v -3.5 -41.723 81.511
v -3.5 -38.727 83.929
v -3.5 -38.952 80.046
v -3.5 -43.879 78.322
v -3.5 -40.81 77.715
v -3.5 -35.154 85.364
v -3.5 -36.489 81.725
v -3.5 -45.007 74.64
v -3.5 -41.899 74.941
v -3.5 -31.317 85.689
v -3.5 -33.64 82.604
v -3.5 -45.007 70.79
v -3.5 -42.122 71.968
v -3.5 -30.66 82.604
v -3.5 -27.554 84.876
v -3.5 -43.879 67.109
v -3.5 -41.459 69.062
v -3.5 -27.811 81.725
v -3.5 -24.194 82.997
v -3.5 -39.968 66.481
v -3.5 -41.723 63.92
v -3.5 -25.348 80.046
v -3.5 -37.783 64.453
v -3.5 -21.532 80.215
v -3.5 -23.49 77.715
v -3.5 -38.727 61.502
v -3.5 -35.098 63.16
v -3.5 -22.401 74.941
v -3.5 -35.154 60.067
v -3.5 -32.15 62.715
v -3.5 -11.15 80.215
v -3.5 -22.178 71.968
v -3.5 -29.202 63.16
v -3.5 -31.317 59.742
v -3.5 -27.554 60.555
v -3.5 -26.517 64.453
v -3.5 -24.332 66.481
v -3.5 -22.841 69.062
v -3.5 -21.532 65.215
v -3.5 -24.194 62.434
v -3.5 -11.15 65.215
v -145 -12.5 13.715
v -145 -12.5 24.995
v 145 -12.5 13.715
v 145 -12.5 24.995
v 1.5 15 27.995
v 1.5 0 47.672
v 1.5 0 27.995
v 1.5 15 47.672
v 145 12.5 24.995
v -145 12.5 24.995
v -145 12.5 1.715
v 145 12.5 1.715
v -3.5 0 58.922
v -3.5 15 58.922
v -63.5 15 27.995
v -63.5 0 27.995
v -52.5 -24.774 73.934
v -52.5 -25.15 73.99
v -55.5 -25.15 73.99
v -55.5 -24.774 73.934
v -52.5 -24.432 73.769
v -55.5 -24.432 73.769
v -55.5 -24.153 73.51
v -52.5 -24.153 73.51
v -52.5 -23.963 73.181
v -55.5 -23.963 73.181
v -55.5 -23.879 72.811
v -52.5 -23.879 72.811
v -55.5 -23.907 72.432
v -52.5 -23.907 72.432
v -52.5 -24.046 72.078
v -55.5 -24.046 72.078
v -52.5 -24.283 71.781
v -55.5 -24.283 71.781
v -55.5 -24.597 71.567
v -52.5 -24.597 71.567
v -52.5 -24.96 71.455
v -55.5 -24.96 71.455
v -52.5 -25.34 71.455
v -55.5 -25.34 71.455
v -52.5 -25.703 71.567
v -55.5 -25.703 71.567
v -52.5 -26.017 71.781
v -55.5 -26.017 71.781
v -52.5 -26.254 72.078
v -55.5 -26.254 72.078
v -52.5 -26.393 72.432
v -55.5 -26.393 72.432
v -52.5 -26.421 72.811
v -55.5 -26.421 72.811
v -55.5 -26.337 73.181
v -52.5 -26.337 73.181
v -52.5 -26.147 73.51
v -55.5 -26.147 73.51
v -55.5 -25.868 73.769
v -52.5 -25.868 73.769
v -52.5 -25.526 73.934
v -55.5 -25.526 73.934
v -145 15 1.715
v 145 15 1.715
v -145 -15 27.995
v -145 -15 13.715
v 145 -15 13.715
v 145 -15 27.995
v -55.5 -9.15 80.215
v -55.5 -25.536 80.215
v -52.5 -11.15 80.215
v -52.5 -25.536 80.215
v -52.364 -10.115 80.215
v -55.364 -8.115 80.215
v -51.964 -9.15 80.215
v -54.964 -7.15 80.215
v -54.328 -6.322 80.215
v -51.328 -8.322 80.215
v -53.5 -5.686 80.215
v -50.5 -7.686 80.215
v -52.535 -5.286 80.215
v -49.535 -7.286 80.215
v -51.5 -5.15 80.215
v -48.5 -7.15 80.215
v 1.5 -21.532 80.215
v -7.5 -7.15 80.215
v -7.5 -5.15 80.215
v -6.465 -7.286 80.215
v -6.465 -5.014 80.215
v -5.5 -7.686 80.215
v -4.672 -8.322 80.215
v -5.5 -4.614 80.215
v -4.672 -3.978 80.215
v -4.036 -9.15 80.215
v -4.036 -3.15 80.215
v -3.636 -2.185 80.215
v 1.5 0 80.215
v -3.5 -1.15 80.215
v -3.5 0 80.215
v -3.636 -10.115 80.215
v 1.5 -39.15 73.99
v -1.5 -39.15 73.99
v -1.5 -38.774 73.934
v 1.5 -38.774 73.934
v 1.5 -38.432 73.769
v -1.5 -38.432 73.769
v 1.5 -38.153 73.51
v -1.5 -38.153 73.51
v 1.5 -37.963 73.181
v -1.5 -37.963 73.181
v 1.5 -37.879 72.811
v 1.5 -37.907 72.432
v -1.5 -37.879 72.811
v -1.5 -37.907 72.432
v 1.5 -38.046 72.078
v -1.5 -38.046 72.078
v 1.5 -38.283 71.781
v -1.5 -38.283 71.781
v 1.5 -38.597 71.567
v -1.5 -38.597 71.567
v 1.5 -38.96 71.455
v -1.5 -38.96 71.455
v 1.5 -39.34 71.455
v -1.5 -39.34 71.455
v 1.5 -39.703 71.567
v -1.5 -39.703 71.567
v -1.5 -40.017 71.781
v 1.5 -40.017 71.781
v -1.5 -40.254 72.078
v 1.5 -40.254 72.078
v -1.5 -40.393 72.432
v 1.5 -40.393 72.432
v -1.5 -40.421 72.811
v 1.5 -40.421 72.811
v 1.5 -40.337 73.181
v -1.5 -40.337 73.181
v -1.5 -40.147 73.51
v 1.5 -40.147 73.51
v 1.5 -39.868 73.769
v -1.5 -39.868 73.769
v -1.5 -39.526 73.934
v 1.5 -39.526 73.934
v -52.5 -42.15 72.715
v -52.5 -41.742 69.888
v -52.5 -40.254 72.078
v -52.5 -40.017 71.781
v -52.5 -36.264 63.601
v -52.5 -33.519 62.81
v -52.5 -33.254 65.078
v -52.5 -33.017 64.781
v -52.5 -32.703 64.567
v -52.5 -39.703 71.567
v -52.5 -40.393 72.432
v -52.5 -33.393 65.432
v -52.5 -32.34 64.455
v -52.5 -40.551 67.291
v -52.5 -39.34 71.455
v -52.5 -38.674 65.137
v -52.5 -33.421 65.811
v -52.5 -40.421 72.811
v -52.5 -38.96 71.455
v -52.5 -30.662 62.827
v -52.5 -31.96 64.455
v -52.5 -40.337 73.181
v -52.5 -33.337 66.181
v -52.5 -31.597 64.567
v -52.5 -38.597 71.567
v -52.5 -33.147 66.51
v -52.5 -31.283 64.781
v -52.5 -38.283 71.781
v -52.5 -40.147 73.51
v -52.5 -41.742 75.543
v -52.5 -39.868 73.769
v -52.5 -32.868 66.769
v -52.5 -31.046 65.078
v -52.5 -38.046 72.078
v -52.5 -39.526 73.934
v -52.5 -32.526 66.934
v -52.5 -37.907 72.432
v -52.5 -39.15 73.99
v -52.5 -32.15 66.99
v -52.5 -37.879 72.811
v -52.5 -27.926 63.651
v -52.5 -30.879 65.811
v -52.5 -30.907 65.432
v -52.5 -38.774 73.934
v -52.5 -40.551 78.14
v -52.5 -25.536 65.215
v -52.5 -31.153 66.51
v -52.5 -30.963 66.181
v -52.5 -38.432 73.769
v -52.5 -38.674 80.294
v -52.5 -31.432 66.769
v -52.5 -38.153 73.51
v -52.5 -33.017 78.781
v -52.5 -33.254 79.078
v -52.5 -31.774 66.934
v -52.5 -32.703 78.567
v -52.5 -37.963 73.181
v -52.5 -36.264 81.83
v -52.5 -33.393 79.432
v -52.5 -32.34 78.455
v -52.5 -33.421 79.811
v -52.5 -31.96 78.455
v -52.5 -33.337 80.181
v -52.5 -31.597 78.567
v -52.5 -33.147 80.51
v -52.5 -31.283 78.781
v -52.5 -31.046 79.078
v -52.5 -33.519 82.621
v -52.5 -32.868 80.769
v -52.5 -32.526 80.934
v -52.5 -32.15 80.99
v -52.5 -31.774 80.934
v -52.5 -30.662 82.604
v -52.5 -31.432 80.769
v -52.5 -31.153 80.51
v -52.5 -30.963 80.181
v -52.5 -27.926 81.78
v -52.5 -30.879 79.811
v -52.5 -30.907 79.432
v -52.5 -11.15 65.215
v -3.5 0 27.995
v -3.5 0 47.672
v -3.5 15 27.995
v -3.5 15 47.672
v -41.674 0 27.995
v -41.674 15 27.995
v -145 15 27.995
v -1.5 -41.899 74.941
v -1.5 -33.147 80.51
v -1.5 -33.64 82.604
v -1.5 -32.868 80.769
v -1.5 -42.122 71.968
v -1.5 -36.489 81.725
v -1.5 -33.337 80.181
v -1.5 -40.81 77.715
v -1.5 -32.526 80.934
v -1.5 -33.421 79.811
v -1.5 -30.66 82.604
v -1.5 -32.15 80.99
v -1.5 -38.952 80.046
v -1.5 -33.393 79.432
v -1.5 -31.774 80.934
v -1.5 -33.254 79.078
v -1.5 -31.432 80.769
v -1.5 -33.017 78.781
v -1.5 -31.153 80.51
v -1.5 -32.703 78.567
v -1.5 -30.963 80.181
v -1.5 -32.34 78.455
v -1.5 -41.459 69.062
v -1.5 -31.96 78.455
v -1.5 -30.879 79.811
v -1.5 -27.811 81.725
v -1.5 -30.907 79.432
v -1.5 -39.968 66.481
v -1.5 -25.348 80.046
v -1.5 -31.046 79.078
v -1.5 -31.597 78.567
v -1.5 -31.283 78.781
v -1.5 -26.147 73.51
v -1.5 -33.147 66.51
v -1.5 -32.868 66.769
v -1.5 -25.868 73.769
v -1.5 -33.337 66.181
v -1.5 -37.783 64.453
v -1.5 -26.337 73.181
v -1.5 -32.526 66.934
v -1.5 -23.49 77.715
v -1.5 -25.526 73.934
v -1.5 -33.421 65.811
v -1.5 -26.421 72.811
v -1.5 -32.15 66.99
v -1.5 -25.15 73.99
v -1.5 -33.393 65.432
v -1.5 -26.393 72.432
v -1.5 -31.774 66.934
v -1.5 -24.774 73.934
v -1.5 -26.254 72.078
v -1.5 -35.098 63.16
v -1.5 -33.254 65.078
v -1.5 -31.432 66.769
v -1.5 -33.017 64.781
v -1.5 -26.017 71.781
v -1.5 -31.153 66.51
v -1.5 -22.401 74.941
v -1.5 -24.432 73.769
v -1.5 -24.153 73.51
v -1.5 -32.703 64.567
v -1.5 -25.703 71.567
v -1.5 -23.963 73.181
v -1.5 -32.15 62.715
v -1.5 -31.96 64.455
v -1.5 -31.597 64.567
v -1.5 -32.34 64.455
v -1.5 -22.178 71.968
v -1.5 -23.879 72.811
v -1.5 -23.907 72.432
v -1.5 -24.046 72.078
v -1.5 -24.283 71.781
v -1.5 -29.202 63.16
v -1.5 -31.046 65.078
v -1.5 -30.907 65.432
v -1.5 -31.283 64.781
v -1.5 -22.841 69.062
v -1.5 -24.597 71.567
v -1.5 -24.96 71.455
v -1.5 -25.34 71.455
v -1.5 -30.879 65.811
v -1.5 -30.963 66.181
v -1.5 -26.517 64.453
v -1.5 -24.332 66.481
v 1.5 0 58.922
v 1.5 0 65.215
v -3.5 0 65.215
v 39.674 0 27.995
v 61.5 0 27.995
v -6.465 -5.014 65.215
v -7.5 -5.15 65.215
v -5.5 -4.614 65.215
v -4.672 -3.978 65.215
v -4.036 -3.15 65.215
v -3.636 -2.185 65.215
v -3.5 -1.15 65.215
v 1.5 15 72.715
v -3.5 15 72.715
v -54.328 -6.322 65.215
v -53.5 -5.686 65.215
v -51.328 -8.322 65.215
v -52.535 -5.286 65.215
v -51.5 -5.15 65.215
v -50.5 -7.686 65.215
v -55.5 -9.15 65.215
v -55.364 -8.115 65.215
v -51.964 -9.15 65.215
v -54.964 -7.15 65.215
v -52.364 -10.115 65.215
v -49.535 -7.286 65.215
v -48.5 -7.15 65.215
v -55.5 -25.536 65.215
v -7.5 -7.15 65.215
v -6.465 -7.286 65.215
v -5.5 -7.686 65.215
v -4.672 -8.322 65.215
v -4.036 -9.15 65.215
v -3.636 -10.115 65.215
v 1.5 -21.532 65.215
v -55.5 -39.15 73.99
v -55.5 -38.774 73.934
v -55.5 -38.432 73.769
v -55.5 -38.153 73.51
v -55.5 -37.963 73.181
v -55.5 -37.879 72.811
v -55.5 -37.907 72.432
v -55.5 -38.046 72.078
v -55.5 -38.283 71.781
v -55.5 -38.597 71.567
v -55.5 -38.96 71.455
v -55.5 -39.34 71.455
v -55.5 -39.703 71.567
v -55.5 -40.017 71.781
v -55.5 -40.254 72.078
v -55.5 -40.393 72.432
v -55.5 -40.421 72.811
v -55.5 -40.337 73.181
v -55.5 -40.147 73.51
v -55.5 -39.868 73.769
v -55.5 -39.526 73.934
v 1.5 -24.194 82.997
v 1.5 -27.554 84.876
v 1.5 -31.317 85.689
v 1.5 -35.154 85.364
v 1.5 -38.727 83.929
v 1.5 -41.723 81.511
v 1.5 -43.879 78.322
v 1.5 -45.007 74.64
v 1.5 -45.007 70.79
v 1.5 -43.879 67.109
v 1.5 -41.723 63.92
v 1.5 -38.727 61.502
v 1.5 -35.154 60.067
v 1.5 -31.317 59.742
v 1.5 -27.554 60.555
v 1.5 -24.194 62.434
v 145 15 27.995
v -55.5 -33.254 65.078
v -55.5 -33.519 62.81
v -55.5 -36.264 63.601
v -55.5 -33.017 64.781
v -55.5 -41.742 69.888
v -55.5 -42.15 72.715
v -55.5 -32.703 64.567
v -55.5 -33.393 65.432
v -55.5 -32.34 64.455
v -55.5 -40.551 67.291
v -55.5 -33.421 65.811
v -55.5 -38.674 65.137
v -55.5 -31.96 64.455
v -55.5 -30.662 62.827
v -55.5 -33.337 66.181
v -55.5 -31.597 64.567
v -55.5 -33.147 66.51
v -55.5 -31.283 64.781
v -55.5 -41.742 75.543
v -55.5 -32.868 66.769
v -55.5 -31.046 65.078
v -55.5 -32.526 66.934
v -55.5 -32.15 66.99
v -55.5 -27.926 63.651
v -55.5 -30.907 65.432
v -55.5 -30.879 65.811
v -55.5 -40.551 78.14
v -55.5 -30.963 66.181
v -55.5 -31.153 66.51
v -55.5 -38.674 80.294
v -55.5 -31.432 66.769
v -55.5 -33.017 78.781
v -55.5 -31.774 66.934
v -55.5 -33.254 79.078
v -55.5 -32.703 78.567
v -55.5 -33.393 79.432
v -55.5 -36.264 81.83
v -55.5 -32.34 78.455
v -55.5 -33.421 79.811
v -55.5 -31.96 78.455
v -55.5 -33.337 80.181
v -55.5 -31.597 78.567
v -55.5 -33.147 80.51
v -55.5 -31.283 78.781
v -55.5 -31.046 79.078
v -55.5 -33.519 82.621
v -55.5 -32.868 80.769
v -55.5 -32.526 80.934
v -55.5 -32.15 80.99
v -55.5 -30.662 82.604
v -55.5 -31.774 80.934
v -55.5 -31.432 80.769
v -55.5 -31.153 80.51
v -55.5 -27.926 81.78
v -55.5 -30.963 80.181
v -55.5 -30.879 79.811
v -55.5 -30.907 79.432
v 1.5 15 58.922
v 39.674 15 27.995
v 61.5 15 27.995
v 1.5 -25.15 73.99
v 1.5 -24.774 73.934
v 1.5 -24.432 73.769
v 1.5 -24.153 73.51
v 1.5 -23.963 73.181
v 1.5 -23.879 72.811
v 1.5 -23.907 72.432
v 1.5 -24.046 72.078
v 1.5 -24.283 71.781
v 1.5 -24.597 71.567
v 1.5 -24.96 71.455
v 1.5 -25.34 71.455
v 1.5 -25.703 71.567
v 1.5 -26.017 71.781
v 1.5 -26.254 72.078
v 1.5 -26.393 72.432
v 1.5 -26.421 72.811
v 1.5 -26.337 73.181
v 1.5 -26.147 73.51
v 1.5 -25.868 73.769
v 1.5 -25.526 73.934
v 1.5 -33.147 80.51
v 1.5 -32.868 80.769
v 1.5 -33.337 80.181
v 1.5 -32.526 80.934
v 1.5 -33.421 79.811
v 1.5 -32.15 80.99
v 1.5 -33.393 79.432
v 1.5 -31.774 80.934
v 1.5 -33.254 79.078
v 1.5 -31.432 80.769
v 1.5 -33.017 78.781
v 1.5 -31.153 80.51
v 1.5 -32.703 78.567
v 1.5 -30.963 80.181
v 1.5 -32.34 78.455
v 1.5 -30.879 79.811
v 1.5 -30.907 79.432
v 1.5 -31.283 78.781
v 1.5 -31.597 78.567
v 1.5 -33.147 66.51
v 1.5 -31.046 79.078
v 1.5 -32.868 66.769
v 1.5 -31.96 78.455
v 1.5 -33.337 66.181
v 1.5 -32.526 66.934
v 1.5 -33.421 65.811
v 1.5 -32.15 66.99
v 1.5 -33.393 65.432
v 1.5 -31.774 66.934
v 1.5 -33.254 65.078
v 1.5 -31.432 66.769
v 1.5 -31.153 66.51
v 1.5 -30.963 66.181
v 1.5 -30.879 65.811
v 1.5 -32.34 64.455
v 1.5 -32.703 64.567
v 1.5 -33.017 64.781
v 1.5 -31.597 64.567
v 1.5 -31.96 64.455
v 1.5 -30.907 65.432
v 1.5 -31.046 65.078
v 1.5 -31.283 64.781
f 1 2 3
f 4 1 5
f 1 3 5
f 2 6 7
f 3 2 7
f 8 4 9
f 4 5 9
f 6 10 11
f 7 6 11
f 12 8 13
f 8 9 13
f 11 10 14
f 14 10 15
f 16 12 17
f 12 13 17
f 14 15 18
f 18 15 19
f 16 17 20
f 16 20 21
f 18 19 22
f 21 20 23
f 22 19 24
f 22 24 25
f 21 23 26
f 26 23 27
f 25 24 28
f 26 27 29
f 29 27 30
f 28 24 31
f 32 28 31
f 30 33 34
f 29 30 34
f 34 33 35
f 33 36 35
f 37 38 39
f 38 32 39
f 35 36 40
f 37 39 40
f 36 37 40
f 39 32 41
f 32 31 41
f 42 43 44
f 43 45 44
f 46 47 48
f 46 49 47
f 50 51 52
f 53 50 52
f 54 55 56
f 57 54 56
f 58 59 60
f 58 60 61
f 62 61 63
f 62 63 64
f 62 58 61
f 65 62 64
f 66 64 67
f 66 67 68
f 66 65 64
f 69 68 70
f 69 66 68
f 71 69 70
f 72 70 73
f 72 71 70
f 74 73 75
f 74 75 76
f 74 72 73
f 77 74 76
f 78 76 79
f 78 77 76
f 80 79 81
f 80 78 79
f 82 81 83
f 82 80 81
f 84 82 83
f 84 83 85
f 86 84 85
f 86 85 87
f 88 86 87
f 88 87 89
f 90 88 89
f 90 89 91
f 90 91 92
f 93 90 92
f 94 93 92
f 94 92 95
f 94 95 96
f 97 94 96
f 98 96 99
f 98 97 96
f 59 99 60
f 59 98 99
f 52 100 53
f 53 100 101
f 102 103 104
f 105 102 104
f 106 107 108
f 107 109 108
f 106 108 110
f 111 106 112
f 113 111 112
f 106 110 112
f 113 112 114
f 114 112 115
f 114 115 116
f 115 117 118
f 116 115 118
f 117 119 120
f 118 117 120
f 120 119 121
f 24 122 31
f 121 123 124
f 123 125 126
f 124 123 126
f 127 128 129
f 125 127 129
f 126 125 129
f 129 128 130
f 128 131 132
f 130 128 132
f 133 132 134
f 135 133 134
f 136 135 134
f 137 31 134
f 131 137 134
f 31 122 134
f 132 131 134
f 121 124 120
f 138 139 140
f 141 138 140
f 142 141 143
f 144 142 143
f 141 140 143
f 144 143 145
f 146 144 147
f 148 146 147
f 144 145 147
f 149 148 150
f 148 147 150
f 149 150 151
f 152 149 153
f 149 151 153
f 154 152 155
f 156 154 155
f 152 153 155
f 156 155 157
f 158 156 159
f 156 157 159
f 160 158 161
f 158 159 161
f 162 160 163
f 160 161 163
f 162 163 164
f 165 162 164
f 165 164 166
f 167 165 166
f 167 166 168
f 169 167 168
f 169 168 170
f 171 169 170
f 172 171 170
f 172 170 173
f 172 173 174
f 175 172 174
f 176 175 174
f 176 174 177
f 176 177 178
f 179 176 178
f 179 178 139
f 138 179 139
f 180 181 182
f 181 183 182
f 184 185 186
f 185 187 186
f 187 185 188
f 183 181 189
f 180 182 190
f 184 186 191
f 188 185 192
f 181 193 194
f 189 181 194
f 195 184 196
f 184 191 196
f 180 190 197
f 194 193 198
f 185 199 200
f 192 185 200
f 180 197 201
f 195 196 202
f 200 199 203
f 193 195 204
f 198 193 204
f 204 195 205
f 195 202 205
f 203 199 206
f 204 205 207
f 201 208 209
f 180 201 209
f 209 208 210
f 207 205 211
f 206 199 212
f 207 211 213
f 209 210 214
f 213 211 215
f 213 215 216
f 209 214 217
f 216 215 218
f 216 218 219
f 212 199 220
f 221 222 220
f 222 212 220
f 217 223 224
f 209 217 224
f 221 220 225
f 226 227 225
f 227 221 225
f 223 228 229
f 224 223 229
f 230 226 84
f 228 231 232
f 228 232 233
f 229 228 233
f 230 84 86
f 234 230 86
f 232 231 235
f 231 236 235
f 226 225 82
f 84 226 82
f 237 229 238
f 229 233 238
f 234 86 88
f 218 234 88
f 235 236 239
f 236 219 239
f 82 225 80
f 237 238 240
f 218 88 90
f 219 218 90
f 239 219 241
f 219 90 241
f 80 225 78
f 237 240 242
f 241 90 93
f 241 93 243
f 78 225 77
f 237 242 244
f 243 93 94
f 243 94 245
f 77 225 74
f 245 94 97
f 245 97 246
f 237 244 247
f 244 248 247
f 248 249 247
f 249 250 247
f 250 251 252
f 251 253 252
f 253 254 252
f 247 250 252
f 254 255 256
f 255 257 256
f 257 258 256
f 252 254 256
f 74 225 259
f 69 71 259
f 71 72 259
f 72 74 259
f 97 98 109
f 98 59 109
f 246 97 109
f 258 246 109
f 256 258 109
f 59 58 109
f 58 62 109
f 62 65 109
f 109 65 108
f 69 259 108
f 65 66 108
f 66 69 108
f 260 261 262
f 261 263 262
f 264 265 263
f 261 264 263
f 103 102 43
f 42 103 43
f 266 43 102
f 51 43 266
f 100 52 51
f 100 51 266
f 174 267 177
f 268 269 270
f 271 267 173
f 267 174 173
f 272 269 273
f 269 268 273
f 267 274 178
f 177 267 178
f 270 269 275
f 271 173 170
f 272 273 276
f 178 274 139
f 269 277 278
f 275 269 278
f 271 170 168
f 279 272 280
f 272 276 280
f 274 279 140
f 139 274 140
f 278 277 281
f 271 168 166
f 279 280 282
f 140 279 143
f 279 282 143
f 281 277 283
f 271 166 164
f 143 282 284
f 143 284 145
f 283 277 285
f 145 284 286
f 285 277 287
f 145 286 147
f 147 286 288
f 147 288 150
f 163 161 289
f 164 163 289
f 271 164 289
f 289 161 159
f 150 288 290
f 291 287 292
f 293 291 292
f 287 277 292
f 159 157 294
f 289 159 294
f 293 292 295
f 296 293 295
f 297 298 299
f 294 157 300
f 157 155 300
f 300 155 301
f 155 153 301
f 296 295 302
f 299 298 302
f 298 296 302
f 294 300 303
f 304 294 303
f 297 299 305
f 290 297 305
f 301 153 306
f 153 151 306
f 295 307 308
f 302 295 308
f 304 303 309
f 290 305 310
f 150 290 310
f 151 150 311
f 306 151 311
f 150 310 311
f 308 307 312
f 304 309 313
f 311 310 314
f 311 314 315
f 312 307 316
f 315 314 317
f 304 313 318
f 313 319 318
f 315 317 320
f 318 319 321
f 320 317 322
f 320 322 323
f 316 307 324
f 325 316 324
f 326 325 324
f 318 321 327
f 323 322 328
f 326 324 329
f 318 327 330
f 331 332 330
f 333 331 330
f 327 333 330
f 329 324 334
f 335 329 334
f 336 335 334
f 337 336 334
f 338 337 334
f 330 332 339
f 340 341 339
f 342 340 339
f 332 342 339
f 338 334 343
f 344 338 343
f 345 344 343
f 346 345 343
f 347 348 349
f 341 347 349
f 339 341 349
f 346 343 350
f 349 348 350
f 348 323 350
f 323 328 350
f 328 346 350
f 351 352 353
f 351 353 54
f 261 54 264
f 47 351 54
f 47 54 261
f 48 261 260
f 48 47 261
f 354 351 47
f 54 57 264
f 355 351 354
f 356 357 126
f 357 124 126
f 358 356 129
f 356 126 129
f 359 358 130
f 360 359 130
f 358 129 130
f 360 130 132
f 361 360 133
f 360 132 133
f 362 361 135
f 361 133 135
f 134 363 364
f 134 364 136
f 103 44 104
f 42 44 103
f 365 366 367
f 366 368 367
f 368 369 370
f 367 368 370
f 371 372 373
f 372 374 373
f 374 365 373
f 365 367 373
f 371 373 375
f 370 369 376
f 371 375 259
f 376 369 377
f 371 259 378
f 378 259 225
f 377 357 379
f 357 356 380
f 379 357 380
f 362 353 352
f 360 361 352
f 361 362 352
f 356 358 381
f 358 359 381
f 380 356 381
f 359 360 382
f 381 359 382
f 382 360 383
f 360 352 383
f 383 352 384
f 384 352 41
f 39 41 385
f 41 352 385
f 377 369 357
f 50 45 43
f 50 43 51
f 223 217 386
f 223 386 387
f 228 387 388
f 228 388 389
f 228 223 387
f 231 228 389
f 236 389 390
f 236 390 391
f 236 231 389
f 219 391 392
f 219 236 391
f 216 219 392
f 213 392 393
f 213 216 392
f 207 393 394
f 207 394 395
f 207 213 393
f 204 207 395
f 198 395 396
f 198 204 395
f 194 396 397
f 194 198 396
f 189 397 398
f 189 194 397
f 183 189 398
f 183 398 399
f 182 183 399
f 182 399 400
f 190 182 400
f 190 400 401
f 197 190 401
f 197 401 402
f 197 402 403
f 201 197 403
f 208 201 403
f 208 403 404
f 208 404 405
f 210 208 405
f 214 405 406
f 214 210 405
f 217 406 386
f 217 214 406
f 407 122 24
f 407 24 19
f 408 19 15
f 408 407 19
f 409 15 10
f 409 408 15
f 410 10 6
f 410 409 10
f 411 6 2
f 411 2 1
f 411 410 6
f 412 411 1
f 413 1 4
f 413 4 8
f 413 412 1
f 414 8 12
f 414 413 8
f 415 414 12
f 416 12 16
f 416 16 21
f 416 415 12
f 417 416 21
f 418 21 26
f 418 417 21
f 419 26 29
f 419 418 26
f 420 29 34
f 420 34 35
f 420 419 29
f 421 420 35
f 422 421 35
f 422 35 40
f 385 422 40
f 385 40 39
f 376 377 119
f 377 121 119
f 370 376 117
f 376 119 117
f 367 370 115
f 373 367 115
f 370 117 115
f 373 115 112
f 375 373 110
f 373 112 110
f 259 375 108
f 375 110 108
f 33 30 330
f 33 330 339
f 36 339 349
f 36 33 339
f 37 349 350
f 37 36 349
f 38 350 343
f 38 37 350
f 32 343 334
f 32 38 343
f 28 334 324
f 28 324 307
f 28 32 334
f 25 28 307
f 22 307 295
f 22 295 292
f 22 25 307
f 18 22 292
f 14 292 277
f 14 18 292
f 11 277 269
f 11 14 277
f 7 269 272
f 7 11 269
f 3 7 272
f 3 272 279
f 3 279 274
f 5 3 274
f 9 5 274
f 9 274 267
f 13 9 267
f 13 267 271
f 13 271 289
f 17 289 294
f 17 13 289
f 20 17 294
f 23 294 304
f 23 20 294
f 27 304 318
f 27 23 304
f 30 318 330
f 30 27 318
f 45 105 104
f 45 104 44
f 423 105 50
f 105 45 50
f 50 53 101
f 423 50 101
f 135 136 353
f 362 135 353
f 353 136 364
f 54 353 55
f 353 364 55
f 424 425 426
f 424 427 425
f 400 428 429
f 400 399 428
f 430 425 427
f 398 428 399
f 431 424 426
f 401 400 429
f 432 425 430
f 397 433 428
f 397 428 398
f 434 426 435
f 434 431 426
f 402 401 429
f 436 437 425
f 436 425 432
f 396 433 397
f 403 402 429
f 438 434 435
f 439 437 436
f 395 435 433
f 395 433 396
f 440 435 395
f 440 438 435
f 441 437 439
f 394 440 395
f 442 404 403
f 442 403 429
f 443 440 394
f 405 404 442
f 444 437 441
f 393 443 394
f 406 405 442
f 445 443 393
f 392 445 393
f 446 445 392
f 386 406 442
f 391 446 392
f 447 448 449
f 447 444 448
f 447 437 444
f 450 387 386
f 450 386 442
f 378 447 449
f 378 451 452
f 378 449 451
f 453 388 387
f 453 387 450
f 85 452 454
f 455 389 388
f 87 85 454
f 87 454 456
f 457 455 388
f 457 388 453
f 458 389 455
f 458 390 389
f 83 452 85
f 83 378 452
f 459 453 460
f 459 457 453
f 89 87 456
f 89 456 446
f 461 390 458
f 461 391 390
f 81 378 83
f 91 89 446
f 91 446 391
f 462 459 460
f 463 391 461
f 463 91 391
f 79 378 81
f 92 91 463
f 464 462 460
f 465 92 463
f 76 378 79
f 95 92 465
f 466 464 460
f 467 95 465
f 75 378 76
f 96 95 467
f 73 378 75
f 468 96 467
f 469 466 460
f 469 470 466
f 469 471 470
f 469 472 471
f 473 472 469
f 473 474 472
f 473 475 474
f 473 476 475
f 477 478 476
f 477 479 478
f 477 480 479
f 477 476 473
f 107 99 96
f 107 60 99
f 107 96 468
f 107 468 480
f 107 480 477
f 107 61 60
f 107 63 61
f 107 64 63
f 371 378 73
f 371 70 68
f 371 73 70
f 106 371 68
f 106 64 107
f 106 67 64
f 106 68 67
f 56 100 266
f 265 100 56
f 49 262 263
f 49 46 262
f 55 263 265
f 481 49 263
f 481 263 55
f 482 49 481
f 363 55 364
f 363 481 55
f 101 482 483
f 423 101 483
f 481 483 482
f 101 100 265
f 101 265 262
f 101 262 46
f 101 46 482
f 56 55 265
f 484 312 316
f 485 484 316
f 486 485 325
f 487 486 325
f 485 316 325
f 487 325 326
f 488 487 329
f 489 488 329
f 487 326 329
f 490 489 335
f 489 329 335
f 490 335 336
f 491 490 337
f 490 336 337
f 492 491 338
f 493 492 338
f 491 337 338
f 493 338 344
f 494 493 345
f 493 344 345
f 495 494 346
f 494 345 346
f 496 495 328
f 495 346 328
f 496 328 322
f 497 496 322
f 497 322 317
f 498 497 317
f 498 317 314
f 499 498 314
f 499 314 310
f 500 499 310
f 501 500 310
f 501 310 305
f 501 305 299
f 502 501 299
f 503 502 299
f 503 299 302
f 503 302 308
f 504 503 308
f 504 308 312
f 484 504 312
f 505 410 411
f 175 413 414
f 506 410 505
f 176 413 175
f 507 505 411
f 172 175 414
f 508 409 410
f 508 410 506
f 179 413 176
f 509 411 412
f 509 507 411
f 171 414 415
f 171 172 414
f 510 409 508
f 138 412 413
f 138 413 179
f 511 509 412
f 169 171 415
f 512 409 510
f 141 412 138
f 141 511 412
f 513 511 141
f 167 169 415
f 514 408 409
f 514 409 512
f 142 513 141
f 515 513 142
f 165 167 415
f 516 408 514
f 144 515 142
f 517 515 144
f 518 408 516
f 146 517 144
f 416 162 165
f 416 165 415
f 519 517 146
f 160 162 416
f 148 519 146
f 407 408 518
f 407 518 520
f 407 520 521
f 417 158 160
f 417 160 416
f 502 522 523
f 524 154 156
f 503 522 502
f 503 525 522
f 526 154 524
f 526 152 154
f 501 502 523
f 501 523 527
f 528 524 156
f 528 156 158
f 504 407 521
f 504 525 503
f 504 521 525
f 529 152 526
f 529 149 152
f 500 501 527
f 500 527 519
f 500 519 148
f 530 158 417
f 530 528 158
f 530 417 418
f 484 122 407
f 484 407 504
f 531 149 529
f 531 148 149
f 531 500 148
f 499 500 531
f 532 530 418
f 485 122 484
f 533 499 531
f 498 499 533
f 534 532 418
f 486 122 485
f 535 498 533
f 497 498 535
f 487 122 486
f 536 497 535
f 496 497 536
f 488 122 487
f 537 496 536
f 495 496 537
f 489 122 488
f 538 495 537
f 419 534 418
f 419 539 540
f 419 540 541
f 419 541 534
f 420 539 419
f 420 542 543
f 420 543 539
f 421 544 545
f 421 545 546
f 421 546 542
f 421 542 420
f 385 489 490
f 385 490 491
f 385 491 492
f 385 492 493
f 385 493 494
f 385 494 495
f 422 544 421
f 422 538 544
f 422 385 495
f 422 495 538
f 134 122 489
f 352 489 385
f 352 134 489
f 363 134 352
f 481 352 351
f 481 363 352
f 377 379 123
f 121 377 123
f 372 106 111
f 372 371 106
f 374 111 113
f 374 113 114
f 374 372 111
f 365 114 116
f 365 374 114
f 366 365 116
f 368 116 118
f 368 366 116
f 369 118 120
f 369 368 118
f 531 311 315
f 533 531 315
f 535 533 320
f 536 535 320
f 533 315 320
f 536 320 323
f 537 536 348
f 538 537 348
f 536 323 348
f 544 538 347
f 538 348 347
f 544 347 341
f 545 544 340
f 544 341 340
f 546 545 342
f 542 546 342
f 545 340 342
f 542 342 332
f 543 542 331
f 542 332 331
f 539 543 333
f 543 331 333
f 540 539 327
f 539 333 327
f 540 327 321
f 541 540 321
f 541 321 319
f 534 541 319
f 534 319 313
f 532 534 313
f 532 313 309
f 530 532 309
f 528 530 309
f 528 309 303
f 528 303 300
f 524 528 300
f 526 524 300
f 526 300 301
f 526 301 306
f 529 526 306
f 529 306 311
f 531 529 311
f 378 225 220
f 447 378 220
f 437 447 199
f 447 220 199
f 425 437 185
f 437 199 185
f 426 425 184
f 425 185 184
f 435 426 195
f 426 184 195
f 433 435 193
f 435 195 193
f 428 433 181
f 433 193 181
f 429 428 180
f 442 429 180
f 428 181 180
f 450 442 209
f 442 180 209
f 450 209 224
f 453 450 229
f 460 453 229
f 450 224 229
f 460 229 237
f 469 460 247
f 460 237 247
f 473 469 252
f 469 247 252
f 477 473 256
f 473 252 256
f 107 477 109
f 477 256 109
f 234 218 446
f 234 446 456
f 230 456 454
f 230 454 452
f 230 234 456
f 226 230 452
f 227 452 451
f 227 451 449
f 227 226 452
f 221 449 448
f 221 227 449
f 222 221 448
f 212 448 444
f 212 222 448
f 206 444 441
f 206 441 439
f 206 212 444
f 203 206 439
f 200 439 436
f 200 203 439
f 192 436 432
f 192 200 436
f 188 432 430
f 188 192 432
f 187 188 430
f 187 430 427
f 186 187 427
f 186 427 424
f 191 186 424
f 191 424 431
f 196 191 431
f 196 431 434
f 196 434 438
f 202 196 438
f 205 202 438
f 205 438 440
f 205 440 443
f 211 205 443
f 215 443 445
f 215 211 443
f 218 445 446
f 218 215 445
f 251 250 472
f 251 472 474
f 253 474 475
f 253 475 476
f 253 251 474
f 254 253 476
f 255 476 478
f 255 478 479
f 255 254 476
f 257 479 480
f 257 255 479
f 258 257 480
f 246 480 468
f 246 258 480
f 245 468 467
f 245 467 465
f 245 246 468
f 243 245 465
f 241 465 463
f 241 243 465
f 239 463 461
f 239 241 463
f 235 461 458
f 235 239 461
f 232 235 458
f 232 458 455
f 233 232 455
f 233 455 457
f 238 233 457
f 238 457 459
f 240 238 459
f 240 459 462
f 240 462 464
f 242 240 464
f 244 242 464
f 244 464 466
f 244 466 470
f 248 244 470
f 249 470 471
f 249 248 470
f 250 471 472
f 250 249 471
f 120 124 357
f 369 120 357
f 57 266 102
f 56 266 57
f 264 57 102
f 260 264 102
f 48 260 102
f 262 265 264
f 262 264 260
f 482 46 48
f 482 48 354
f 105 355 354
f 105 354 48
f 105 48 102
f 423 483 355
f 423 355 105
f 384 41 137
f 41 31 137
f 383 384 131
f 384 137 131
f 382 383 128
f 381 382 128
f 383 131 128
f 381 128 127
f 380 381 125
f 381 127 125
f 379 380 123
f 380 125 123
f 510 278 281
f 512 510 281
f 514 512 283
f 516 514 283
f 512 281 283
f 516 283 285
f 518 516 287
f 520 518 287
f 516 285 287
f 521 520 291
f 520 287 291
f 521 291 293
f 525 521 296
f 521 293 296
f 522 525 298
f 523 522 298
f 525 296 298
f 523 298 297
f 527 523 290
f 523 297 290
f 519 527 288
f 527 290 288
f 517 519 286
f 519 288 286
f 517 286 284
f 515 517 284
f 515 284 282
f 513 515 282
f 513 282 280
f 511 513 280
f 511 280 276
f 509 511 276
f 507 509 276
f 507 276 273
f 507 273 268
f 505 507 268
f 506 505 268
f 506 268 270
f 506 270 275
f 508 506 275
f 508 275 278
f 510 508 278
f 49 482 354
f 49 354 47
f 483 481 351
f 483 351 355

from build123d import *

# Parameters (mm, degrees)
SKETCH2_W                = 290
SKETCH2_H                = 30
SKETCH2_W_2              = 280
SKETCH2_H_2              = 25
BOSS_EXTRUDE1_DEPTH      = 23.28
SKETCH3_W                = 290
SKETCH3_H                = 30
BOSS_EXTRUDE2_DEPTH      = 3
SKETCH4_W                = 23.28
SKETCH4_H                = 25
CUT_EXTRUDE1_DEPTH       = 1
CUT_EXTRUDE1_DEPTH_BACK  = 291
BOSS_EXTRUDE3_DEPTH      = 2
BOSS_EXTRUDE3_DEPTH_BACK = 3
SKETCH6_R                = 10
CUT_EXTRUDE2_DEPTH       = 2
SKETCH7_R                = 1.275
CUT_EXTRUDE3_DEPTH       = 10
SKETCH8_W                = 290
SKETCH8_H                = 2.5
CUT_EXTRUDE4_DEPTH       = 12
BOSS_EXTRUDE4_DEPTH      = 15
ESQUISSE1_W              = 15
ESQUISSE1_H              = 2
BOSS_EXTRU_1_DEPTH       = 49
ESQUISSE2_R              = 1.275
BOSS_EXTRU_2_DEPTH       = 3
CONG_1_R                 = 4


with BuildPart() as part:
    # Sketch2 → Boss-Extrude1 (new body)
    with BuildSketch(Plane.XY.offset(1.715456747)):
        Rectangle(SKETCH2_W, SKETCH2_H)
        Rectangle(SKETCH2_W_2, SKETCH2_H_2, mode=Mode.SUBTRACT)
    extrude(amount=BOSS_EXTRUDE1_DEPTH)

    # Sketch3 → Boss-Extrude2 (add)
    with BuildSketch(Plane.XY.offset(24.995456747)):
        Rectangle(SKETCH3_W, SKETCH3_H)
    extrude(amount=BOSS_EXTRUDE2_DEPTH)

    # Sketch4 → Cut-Extrude1 (cut, two sides)
    with BuildSketch(Plane(origin=(145, 0, 0), x_dir=(0, 0, -1), z_dir=(1, 0, 0))) as cut_extrude1_sk:
        with Locations((-13.355456747, 0)):
            Rectangle(SKETCH4_W, SKETCH4_H)
    extrude(amount=CUT_EXTRUDE1_DEPTH, mode=Mode.SUBTRACT)
    extrude(cut_extrude1_sk.sketch, amount=-CUT_EXTRUDE1_DEPTH_BACK, mode=Mode.SUBTRACT)

    # Sketch5 → Boss-Extrude3 (add, two sides)
    with BuildSketch(Plane(origin=(-0.5, 0, 0), x_dir=(0, 0, -1), z_dir=(1, 0, 0))) as boss_extrude3_sk:
        with BuildLine():
            Line((-27.995456747, 0), (-27.995456747, 15))
            Line((-27.995456747, 15), (-72.715456747, 15))
            Line((-72.715456747, 15), (-80.215456747, 0))
            Line((-80.215456747, 0), (-80.215456747, -21.531619709))
            ThreePointArc((-80.215456747, -21.531619709), (-72.715456747, -45.15), (-65.215456747, -21.531619709))
            Line((-65.215456747, -21.531619709), (-65.215456747, 0))
            Line((-65.215456747, 0), (-27.995456747, 0))
        make_face()
    extrude(amount=BOSS_EXTRUDE3_DEPTH)
    extrude(boss_extrude3_sk.sketch, amount=-BOSS_EXTRUDE3_DEPTH_BACK)

    # Sketch6 → Cut-Extrude2 (cut)
    with BuildSketch(Plane(origin=(-3.5, 0, 0), x_dir=(0, 0, -1), z_dir=(1, 0, 0))):
        with Locations((-72.715456747, -32.15)):
            Circle(SKETCH6_R)
    extrude(amount=CUT_EXTRUDE2_DEPTH, mode=Mode.SUBTRACT)

    # Sketch7 → Cut-Extrude3 (cut)
    with BuildSketch(Plane.ZY.offset(3.5)):
        with Locations((72.715456747, -25.15)):
            Circle(SKETCH7_R)
        with Locations((79.715456747, -32.15)):
            Circle(SKETCH7_R)
        with Locations((72.715456747, -39.15)):
            Circle(SKETCH7_R)
        with Locations((65.715456747, -32.15)):
            Circle(SKETCH7_R)
    extrude(amount=-CUT_EXTRUDE3_DEPTH, mode=Mode.SUBTRACT)

    # Sketch8 → Cut-Extrude4 (cut)
    with BuildSketch(Plane(origin=(0, 0, 1.715456747), x_dir=(-1, 0, 0), z_dir=(0, 0, -1))):
        with Locations((0, -13.75)):
            Rectangle(SKETCH8_W, SKETCH8_H)
    extrude(amount=-CUT_EXTRUDE4_DEPTH, mode=Mode.SUBTRACT)

    # Sketch9 → Boss-Extrude4 (add)
    with BuildSketch(Plane(origin=(0, 15, 0), x_dir=(1, 0, 0), z_dir=(0, 1, 0))):
        Polygon((-3.5, -58.92224084), (-63.5, -27.995456747), (-41.673741056, -27.995456747), (-3.5, -47.671974209), align=None)
        Polygon((61.5, -27.995456747), (39.673741056, -27.995456747), (1.5, -47.671974209), (1.5, -58.92224084), align=None)
    extrude(amount=-BOSS_EXTRUDE4_DEPTH)

    # Esquisse1 → Boss.-Extru.1 (add)
    with BuildSketch(Plane.ZY.offset(3.5)):
        with Locations((72.715456747, -6.15)):
            Rectangle(ESQUISSE1_W, ESQUISSE1_H)
    extrude(amount=BOSS_EXTRU_1_DEPTH)

    # Esquisse2 → Boss.-Extru.2 (add)
    with BuildSketch(Plane.ZY.offset(52.5)):
        with BuildLine():
            Line((65.215456747, -21.531619709), (65.215456747, -25.535621722))
            ThreePointArc((65.215456747, -25.535621722), (72.715456747, -42.15), (80.215456747, -25.535621722))
            Line((80.215456747, -25.535621722), (80.215456747, -21.531619709))
            Line((80.215456747, -21.531619709), (80.215456747, -7.15))
            Line((80.215456747, -7.15), (80.215456747, -5.15))
            Line((80.215456747, -5.15), (65.215456747, -5.15))
            Line((65.215456747, -5.15), (65.215456747, -7.15))
            Line((65.215456747, -7.15), (65.215456747, -12.828367585))
            Line((65.215456747, -12.828367585), (65.215456747, -21.531619709))
        make_face()
        with Locations((72.715456747, -39.15)):
            Circle(ESQUISSE2_R, mode=Mode.SUBTRACT)
        with Locations((79.715456747, -32.15)):
            Circle(ESQUISSE2_R, mode=Mode.SUBTRACT)
        with Locations((72.715456747, -25.15)):
            Circle(ESQUISSE2_R, mode=Mode.SUBTRACT)
        with Locations((65.715456747, -32.15)):
            Circle(ESQUISSE2_R, mode=Mode.SUBTRACT)
    extrude(amount=BOSS_EXTRU_2_DEPTH)

    # Congé1
    cong_1_edges = [part.edges().sort_by_distance(p)[0] for p in [
        (-3.5, -7.15, 72.715456747),
        (-3.5, -5.15, 72.715456747),
        (-52.5, -7.15, 72.715456747),
        (-55.5, -5.15, 72.715456747),
    ]]
    fillet(cong_1_edges, radius=CONG_1_R)


solid = part.part
